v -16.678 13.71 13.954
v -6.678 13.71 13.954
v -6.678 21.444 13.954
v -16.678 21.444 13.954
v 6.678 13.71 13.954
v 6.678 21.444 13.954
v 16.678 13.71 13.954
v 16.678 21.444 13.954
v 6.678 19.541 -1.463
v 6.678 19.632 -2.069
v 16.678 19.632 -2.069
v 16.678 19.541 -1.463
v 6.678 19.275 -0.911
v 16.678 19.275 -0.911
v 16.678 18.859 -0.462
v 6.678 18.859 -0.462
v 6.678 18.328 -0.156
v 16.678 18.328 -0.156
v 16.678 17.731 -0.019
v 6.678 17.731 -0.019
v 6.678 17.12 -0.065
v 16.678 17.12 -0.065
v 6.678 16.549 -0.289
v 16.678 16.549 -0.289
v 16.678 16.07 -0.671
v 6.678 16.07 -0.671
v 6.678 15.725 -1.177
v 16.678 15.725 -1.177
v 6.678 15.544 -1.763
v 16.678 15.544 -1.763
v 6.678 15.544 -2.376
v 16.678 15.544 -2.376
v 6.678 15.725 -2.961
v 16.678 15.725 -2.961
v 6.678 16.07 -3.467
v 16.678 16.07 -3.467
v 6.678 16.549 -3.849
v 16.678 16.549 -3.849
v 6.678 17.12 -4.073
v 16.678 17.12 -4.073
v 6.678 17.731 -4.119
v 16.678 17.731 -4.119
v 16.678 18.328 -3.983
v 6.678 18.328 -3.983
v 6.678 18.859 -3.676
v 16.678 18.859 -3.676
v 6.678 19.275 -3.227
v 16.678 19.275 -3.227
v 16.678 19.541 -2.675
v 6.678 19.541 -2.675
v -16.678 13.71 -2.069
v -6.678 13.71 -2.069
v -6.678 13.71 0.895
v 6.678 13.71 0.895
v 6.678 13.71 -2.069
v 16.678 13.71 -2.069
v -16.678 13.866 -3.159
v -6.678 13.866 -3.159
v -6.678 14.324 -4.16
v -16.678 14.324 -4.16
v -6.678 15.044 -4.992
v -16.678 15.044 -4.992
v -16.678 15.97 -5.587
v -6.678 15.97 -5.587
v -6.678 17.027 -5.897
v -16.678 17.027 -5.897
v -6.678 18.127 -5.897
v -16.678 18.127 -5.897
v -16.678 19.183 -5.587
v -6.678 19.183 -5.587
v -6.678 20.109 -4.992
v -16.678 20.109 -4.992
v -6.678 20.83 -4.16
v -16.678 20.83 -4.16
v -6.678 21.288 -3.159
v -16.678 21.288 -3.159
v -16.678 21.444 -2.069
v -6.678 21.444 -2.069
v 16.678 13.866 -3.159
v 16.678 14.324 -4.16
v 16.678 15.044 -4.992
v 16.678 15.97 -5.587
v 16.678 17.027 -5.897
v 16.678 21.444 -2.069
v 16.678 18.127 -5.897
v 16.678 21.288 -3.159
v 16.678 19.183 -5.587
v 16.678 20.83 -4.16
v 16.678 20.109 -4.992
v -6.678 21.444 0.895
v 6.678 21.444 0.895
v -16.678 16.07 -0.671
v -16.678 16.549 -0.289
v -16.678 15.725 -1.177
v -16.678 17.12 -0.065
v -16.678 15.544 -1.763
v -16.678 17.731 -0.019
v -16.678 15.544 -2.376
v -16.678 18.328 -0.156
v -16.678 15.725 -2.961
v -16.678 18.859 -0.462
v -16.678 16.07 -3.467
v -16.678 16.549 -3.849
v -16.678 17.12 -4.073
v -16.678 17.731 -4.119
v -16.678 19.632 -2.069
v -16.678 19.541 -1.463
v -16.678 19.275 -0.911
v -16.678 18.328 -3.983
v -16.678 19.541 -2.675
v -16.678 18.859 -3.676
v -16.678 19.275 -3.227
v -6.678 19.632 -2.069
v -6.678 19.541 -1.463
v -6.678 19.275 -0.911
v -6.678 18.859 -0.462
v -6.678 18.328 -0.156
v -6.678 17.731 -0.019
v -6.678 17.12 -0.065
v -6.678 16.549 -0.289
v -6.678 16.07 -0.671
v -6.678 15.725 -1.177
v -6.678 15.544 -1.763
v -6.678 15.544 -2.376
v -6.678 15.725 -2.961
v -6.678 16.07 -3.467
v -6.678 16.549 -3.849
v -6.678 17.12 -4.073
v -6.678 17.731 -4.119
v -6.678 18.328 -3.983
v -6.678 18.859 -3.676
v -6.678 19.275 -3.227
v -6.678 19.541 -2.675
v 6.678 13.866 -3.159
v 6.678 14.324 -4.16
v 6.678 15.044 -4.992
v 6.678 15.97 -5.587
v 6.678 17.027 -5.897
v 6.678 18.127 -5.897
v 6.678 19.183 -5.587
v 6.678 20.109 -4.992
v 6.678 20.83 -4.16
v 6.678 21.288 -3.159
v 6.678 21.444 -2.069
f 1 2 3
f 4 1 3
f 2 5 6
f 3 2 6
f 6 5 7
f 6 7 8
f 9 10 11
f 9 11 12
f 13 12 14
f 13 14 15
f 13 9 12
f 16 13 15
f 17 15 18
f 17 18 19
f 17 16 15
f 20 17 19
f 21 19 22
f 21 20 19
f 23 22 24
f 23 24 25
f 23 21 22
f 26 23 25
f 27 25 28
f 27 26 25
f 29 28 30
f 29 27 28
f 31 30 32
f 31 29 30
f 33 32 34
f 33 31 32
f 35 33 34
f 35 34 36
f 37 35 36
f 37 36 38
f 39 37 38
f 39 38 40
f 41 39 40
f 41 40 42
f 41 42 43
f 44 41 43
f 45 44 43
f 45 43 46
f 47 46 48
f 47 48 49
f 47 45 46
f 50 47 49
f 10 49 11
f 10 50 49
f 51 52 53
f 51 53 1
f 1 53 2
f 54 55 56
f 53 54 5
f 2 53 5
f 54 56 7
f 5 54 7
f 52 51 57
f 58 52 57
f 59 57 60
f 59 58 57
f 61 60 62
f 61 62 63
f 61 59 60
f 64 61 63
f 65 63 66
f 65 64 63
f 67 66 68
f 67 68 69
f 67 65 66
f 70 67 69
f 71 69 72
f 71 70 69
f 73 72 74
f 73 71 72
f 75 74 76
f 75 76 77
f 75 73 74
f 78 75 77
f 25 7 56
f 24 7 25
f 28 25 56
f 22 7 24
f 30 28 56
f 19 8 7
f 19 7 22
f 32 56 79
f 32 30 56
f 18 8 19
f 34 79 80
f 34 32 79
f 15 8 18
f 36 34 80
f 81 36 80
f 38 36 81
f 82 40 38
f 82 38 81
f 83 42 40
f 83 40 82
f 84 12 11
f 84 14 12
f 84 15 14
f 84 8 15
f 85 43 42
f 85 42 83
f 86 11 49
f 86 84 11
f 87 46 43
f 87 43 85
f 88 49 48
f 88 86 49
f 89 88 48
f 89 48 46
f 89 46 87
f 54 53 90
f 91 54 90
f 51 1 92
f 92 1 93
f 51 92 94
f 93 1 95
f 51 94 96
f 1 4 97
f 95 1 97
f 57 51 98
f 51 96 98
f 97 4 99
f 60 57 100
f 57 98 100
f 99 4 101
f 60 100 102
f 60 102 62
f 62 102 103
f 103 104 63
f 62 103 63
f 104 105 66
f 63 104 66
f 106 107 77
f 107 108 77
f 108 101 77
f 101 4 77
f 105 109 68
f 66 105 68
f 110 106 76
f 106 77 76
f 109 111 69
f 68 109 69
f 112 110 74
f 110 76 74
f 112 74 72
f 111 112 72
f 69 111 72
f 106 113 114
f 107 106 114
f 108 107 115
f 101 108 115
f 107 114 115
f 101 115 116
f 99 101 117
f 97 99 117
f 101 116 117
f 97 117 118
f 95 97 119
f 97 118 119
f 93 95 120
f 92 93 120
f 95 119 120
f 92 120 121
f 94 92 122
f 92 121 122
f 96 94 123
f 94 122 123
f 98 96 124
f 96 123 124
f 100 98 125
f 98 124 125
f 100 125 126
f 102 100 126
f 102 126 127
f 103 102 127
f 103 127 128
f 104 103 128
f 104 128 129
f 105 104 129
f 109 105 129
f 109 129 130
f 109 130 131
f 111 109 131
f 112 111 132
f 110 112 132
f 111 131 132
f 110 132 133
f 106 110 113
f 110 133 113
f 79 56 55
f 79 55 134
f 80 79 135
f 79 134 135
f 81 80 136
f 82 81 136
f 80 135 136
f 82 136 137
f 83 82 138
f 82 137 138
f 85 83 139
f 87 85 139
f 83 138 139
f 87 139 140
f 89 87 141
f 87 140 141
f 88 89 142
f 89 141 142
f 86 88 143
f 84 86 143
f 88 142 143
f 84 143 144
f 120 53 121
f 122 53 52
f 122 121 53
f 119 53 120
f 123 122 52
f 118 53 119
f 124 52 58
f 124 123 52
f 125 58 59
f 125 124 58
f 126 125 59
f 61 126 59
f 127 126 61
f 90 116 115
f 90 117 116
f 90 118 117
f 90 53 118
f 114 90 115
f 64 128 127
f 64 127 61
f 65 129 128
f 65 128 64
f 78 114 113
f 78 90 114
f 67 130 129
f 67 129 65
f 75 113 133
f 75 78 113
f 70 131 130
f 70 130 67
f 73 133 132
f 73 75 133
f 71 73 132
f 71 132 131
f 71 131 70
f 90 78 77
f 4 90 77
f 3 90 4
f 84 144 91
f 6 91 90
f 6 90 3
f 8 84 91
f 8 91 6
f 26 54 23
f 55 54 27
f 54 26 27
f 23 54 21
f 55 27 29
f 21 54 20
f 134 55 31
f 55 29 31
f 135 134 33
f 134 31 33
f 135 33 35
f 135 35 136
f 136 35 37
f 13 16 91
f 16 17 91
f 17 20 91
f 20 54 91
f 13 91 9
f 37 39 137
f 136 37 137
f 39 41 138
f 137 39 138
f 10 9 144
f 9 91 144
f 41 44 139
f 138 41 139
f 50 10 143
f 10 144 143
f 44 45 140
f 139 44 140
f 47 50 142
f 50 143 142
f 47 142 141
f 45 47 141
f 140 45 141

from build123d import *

# Parameters (mm, degrees)
SKETCH2_R           = 2.055531292
BOSS_EXTRUDE1_DEPTH = 10
SKETCH3_W           = 13.058934706
SKETCH3_H           = 7.734398283
BOSS_EXTRUDE2_DEPTH = 13.356191657


with BuildPart() as part:
    # Sketch2 → Boss-Extrude1 (new body)
    with BuildSketch(Plane(origin=(6.678095828, 0, 0), x_dir=(0, 0, -1), z_dir=(1, 0, 0))):
        with BuildLine():
            Line((2.069151562, 21.444166214), (-3.368651258, 21.444166214))
            Line((-3.368651258, 21.444166214), (-13.95384316, 21.444166214))
            Line((-13.95384316, 21.444166214), (-13.95384316, 13.709767931))
            Line((-13.95384316, 13.709767931), (-3.368651258, 13.709767931))
            Line((-3.368651258, 13.709767931), (2.069151562, 13.709767931))
            ThreePointArc((2.069151562, 13.709767931), (5.936350704, 17.576967072), (2.069151562, 21.444166214))
        make_face()
        with Locations(Location((2.069151562, 17.576967072, 0), (0, 0, 90))):
            Circle(SKETCH2_R, mode=Mode.SUBTRACT)
    extrude(amount=BOSS_EXTRUDE1_DEPTH)


with BuildPart() as body_2:
    # Mirror2: mirrored copy
    add(part.part.mirror(Plane(origin=(0, 0, 0), x_dir=(0, 0, 1), z_dir=(1, 0, 0))))


with BuildPart() as part_1:
    add(part.part)

    add(body_2.part)  # Boss-Extrude2 merges body 2
    # Sketch3 → Boss-Extrude2 (add)
    with BuildSketch(Plane.ZY.offset(-6.678095828)):
        with Locations((7.424375807, 17.576967073)):
            Rectangle(SKETCH3_W, SKETCH3_H)
    extrude(amount=BOSS_EXTRUDE2_DEPTH)


solid = part_1.part
